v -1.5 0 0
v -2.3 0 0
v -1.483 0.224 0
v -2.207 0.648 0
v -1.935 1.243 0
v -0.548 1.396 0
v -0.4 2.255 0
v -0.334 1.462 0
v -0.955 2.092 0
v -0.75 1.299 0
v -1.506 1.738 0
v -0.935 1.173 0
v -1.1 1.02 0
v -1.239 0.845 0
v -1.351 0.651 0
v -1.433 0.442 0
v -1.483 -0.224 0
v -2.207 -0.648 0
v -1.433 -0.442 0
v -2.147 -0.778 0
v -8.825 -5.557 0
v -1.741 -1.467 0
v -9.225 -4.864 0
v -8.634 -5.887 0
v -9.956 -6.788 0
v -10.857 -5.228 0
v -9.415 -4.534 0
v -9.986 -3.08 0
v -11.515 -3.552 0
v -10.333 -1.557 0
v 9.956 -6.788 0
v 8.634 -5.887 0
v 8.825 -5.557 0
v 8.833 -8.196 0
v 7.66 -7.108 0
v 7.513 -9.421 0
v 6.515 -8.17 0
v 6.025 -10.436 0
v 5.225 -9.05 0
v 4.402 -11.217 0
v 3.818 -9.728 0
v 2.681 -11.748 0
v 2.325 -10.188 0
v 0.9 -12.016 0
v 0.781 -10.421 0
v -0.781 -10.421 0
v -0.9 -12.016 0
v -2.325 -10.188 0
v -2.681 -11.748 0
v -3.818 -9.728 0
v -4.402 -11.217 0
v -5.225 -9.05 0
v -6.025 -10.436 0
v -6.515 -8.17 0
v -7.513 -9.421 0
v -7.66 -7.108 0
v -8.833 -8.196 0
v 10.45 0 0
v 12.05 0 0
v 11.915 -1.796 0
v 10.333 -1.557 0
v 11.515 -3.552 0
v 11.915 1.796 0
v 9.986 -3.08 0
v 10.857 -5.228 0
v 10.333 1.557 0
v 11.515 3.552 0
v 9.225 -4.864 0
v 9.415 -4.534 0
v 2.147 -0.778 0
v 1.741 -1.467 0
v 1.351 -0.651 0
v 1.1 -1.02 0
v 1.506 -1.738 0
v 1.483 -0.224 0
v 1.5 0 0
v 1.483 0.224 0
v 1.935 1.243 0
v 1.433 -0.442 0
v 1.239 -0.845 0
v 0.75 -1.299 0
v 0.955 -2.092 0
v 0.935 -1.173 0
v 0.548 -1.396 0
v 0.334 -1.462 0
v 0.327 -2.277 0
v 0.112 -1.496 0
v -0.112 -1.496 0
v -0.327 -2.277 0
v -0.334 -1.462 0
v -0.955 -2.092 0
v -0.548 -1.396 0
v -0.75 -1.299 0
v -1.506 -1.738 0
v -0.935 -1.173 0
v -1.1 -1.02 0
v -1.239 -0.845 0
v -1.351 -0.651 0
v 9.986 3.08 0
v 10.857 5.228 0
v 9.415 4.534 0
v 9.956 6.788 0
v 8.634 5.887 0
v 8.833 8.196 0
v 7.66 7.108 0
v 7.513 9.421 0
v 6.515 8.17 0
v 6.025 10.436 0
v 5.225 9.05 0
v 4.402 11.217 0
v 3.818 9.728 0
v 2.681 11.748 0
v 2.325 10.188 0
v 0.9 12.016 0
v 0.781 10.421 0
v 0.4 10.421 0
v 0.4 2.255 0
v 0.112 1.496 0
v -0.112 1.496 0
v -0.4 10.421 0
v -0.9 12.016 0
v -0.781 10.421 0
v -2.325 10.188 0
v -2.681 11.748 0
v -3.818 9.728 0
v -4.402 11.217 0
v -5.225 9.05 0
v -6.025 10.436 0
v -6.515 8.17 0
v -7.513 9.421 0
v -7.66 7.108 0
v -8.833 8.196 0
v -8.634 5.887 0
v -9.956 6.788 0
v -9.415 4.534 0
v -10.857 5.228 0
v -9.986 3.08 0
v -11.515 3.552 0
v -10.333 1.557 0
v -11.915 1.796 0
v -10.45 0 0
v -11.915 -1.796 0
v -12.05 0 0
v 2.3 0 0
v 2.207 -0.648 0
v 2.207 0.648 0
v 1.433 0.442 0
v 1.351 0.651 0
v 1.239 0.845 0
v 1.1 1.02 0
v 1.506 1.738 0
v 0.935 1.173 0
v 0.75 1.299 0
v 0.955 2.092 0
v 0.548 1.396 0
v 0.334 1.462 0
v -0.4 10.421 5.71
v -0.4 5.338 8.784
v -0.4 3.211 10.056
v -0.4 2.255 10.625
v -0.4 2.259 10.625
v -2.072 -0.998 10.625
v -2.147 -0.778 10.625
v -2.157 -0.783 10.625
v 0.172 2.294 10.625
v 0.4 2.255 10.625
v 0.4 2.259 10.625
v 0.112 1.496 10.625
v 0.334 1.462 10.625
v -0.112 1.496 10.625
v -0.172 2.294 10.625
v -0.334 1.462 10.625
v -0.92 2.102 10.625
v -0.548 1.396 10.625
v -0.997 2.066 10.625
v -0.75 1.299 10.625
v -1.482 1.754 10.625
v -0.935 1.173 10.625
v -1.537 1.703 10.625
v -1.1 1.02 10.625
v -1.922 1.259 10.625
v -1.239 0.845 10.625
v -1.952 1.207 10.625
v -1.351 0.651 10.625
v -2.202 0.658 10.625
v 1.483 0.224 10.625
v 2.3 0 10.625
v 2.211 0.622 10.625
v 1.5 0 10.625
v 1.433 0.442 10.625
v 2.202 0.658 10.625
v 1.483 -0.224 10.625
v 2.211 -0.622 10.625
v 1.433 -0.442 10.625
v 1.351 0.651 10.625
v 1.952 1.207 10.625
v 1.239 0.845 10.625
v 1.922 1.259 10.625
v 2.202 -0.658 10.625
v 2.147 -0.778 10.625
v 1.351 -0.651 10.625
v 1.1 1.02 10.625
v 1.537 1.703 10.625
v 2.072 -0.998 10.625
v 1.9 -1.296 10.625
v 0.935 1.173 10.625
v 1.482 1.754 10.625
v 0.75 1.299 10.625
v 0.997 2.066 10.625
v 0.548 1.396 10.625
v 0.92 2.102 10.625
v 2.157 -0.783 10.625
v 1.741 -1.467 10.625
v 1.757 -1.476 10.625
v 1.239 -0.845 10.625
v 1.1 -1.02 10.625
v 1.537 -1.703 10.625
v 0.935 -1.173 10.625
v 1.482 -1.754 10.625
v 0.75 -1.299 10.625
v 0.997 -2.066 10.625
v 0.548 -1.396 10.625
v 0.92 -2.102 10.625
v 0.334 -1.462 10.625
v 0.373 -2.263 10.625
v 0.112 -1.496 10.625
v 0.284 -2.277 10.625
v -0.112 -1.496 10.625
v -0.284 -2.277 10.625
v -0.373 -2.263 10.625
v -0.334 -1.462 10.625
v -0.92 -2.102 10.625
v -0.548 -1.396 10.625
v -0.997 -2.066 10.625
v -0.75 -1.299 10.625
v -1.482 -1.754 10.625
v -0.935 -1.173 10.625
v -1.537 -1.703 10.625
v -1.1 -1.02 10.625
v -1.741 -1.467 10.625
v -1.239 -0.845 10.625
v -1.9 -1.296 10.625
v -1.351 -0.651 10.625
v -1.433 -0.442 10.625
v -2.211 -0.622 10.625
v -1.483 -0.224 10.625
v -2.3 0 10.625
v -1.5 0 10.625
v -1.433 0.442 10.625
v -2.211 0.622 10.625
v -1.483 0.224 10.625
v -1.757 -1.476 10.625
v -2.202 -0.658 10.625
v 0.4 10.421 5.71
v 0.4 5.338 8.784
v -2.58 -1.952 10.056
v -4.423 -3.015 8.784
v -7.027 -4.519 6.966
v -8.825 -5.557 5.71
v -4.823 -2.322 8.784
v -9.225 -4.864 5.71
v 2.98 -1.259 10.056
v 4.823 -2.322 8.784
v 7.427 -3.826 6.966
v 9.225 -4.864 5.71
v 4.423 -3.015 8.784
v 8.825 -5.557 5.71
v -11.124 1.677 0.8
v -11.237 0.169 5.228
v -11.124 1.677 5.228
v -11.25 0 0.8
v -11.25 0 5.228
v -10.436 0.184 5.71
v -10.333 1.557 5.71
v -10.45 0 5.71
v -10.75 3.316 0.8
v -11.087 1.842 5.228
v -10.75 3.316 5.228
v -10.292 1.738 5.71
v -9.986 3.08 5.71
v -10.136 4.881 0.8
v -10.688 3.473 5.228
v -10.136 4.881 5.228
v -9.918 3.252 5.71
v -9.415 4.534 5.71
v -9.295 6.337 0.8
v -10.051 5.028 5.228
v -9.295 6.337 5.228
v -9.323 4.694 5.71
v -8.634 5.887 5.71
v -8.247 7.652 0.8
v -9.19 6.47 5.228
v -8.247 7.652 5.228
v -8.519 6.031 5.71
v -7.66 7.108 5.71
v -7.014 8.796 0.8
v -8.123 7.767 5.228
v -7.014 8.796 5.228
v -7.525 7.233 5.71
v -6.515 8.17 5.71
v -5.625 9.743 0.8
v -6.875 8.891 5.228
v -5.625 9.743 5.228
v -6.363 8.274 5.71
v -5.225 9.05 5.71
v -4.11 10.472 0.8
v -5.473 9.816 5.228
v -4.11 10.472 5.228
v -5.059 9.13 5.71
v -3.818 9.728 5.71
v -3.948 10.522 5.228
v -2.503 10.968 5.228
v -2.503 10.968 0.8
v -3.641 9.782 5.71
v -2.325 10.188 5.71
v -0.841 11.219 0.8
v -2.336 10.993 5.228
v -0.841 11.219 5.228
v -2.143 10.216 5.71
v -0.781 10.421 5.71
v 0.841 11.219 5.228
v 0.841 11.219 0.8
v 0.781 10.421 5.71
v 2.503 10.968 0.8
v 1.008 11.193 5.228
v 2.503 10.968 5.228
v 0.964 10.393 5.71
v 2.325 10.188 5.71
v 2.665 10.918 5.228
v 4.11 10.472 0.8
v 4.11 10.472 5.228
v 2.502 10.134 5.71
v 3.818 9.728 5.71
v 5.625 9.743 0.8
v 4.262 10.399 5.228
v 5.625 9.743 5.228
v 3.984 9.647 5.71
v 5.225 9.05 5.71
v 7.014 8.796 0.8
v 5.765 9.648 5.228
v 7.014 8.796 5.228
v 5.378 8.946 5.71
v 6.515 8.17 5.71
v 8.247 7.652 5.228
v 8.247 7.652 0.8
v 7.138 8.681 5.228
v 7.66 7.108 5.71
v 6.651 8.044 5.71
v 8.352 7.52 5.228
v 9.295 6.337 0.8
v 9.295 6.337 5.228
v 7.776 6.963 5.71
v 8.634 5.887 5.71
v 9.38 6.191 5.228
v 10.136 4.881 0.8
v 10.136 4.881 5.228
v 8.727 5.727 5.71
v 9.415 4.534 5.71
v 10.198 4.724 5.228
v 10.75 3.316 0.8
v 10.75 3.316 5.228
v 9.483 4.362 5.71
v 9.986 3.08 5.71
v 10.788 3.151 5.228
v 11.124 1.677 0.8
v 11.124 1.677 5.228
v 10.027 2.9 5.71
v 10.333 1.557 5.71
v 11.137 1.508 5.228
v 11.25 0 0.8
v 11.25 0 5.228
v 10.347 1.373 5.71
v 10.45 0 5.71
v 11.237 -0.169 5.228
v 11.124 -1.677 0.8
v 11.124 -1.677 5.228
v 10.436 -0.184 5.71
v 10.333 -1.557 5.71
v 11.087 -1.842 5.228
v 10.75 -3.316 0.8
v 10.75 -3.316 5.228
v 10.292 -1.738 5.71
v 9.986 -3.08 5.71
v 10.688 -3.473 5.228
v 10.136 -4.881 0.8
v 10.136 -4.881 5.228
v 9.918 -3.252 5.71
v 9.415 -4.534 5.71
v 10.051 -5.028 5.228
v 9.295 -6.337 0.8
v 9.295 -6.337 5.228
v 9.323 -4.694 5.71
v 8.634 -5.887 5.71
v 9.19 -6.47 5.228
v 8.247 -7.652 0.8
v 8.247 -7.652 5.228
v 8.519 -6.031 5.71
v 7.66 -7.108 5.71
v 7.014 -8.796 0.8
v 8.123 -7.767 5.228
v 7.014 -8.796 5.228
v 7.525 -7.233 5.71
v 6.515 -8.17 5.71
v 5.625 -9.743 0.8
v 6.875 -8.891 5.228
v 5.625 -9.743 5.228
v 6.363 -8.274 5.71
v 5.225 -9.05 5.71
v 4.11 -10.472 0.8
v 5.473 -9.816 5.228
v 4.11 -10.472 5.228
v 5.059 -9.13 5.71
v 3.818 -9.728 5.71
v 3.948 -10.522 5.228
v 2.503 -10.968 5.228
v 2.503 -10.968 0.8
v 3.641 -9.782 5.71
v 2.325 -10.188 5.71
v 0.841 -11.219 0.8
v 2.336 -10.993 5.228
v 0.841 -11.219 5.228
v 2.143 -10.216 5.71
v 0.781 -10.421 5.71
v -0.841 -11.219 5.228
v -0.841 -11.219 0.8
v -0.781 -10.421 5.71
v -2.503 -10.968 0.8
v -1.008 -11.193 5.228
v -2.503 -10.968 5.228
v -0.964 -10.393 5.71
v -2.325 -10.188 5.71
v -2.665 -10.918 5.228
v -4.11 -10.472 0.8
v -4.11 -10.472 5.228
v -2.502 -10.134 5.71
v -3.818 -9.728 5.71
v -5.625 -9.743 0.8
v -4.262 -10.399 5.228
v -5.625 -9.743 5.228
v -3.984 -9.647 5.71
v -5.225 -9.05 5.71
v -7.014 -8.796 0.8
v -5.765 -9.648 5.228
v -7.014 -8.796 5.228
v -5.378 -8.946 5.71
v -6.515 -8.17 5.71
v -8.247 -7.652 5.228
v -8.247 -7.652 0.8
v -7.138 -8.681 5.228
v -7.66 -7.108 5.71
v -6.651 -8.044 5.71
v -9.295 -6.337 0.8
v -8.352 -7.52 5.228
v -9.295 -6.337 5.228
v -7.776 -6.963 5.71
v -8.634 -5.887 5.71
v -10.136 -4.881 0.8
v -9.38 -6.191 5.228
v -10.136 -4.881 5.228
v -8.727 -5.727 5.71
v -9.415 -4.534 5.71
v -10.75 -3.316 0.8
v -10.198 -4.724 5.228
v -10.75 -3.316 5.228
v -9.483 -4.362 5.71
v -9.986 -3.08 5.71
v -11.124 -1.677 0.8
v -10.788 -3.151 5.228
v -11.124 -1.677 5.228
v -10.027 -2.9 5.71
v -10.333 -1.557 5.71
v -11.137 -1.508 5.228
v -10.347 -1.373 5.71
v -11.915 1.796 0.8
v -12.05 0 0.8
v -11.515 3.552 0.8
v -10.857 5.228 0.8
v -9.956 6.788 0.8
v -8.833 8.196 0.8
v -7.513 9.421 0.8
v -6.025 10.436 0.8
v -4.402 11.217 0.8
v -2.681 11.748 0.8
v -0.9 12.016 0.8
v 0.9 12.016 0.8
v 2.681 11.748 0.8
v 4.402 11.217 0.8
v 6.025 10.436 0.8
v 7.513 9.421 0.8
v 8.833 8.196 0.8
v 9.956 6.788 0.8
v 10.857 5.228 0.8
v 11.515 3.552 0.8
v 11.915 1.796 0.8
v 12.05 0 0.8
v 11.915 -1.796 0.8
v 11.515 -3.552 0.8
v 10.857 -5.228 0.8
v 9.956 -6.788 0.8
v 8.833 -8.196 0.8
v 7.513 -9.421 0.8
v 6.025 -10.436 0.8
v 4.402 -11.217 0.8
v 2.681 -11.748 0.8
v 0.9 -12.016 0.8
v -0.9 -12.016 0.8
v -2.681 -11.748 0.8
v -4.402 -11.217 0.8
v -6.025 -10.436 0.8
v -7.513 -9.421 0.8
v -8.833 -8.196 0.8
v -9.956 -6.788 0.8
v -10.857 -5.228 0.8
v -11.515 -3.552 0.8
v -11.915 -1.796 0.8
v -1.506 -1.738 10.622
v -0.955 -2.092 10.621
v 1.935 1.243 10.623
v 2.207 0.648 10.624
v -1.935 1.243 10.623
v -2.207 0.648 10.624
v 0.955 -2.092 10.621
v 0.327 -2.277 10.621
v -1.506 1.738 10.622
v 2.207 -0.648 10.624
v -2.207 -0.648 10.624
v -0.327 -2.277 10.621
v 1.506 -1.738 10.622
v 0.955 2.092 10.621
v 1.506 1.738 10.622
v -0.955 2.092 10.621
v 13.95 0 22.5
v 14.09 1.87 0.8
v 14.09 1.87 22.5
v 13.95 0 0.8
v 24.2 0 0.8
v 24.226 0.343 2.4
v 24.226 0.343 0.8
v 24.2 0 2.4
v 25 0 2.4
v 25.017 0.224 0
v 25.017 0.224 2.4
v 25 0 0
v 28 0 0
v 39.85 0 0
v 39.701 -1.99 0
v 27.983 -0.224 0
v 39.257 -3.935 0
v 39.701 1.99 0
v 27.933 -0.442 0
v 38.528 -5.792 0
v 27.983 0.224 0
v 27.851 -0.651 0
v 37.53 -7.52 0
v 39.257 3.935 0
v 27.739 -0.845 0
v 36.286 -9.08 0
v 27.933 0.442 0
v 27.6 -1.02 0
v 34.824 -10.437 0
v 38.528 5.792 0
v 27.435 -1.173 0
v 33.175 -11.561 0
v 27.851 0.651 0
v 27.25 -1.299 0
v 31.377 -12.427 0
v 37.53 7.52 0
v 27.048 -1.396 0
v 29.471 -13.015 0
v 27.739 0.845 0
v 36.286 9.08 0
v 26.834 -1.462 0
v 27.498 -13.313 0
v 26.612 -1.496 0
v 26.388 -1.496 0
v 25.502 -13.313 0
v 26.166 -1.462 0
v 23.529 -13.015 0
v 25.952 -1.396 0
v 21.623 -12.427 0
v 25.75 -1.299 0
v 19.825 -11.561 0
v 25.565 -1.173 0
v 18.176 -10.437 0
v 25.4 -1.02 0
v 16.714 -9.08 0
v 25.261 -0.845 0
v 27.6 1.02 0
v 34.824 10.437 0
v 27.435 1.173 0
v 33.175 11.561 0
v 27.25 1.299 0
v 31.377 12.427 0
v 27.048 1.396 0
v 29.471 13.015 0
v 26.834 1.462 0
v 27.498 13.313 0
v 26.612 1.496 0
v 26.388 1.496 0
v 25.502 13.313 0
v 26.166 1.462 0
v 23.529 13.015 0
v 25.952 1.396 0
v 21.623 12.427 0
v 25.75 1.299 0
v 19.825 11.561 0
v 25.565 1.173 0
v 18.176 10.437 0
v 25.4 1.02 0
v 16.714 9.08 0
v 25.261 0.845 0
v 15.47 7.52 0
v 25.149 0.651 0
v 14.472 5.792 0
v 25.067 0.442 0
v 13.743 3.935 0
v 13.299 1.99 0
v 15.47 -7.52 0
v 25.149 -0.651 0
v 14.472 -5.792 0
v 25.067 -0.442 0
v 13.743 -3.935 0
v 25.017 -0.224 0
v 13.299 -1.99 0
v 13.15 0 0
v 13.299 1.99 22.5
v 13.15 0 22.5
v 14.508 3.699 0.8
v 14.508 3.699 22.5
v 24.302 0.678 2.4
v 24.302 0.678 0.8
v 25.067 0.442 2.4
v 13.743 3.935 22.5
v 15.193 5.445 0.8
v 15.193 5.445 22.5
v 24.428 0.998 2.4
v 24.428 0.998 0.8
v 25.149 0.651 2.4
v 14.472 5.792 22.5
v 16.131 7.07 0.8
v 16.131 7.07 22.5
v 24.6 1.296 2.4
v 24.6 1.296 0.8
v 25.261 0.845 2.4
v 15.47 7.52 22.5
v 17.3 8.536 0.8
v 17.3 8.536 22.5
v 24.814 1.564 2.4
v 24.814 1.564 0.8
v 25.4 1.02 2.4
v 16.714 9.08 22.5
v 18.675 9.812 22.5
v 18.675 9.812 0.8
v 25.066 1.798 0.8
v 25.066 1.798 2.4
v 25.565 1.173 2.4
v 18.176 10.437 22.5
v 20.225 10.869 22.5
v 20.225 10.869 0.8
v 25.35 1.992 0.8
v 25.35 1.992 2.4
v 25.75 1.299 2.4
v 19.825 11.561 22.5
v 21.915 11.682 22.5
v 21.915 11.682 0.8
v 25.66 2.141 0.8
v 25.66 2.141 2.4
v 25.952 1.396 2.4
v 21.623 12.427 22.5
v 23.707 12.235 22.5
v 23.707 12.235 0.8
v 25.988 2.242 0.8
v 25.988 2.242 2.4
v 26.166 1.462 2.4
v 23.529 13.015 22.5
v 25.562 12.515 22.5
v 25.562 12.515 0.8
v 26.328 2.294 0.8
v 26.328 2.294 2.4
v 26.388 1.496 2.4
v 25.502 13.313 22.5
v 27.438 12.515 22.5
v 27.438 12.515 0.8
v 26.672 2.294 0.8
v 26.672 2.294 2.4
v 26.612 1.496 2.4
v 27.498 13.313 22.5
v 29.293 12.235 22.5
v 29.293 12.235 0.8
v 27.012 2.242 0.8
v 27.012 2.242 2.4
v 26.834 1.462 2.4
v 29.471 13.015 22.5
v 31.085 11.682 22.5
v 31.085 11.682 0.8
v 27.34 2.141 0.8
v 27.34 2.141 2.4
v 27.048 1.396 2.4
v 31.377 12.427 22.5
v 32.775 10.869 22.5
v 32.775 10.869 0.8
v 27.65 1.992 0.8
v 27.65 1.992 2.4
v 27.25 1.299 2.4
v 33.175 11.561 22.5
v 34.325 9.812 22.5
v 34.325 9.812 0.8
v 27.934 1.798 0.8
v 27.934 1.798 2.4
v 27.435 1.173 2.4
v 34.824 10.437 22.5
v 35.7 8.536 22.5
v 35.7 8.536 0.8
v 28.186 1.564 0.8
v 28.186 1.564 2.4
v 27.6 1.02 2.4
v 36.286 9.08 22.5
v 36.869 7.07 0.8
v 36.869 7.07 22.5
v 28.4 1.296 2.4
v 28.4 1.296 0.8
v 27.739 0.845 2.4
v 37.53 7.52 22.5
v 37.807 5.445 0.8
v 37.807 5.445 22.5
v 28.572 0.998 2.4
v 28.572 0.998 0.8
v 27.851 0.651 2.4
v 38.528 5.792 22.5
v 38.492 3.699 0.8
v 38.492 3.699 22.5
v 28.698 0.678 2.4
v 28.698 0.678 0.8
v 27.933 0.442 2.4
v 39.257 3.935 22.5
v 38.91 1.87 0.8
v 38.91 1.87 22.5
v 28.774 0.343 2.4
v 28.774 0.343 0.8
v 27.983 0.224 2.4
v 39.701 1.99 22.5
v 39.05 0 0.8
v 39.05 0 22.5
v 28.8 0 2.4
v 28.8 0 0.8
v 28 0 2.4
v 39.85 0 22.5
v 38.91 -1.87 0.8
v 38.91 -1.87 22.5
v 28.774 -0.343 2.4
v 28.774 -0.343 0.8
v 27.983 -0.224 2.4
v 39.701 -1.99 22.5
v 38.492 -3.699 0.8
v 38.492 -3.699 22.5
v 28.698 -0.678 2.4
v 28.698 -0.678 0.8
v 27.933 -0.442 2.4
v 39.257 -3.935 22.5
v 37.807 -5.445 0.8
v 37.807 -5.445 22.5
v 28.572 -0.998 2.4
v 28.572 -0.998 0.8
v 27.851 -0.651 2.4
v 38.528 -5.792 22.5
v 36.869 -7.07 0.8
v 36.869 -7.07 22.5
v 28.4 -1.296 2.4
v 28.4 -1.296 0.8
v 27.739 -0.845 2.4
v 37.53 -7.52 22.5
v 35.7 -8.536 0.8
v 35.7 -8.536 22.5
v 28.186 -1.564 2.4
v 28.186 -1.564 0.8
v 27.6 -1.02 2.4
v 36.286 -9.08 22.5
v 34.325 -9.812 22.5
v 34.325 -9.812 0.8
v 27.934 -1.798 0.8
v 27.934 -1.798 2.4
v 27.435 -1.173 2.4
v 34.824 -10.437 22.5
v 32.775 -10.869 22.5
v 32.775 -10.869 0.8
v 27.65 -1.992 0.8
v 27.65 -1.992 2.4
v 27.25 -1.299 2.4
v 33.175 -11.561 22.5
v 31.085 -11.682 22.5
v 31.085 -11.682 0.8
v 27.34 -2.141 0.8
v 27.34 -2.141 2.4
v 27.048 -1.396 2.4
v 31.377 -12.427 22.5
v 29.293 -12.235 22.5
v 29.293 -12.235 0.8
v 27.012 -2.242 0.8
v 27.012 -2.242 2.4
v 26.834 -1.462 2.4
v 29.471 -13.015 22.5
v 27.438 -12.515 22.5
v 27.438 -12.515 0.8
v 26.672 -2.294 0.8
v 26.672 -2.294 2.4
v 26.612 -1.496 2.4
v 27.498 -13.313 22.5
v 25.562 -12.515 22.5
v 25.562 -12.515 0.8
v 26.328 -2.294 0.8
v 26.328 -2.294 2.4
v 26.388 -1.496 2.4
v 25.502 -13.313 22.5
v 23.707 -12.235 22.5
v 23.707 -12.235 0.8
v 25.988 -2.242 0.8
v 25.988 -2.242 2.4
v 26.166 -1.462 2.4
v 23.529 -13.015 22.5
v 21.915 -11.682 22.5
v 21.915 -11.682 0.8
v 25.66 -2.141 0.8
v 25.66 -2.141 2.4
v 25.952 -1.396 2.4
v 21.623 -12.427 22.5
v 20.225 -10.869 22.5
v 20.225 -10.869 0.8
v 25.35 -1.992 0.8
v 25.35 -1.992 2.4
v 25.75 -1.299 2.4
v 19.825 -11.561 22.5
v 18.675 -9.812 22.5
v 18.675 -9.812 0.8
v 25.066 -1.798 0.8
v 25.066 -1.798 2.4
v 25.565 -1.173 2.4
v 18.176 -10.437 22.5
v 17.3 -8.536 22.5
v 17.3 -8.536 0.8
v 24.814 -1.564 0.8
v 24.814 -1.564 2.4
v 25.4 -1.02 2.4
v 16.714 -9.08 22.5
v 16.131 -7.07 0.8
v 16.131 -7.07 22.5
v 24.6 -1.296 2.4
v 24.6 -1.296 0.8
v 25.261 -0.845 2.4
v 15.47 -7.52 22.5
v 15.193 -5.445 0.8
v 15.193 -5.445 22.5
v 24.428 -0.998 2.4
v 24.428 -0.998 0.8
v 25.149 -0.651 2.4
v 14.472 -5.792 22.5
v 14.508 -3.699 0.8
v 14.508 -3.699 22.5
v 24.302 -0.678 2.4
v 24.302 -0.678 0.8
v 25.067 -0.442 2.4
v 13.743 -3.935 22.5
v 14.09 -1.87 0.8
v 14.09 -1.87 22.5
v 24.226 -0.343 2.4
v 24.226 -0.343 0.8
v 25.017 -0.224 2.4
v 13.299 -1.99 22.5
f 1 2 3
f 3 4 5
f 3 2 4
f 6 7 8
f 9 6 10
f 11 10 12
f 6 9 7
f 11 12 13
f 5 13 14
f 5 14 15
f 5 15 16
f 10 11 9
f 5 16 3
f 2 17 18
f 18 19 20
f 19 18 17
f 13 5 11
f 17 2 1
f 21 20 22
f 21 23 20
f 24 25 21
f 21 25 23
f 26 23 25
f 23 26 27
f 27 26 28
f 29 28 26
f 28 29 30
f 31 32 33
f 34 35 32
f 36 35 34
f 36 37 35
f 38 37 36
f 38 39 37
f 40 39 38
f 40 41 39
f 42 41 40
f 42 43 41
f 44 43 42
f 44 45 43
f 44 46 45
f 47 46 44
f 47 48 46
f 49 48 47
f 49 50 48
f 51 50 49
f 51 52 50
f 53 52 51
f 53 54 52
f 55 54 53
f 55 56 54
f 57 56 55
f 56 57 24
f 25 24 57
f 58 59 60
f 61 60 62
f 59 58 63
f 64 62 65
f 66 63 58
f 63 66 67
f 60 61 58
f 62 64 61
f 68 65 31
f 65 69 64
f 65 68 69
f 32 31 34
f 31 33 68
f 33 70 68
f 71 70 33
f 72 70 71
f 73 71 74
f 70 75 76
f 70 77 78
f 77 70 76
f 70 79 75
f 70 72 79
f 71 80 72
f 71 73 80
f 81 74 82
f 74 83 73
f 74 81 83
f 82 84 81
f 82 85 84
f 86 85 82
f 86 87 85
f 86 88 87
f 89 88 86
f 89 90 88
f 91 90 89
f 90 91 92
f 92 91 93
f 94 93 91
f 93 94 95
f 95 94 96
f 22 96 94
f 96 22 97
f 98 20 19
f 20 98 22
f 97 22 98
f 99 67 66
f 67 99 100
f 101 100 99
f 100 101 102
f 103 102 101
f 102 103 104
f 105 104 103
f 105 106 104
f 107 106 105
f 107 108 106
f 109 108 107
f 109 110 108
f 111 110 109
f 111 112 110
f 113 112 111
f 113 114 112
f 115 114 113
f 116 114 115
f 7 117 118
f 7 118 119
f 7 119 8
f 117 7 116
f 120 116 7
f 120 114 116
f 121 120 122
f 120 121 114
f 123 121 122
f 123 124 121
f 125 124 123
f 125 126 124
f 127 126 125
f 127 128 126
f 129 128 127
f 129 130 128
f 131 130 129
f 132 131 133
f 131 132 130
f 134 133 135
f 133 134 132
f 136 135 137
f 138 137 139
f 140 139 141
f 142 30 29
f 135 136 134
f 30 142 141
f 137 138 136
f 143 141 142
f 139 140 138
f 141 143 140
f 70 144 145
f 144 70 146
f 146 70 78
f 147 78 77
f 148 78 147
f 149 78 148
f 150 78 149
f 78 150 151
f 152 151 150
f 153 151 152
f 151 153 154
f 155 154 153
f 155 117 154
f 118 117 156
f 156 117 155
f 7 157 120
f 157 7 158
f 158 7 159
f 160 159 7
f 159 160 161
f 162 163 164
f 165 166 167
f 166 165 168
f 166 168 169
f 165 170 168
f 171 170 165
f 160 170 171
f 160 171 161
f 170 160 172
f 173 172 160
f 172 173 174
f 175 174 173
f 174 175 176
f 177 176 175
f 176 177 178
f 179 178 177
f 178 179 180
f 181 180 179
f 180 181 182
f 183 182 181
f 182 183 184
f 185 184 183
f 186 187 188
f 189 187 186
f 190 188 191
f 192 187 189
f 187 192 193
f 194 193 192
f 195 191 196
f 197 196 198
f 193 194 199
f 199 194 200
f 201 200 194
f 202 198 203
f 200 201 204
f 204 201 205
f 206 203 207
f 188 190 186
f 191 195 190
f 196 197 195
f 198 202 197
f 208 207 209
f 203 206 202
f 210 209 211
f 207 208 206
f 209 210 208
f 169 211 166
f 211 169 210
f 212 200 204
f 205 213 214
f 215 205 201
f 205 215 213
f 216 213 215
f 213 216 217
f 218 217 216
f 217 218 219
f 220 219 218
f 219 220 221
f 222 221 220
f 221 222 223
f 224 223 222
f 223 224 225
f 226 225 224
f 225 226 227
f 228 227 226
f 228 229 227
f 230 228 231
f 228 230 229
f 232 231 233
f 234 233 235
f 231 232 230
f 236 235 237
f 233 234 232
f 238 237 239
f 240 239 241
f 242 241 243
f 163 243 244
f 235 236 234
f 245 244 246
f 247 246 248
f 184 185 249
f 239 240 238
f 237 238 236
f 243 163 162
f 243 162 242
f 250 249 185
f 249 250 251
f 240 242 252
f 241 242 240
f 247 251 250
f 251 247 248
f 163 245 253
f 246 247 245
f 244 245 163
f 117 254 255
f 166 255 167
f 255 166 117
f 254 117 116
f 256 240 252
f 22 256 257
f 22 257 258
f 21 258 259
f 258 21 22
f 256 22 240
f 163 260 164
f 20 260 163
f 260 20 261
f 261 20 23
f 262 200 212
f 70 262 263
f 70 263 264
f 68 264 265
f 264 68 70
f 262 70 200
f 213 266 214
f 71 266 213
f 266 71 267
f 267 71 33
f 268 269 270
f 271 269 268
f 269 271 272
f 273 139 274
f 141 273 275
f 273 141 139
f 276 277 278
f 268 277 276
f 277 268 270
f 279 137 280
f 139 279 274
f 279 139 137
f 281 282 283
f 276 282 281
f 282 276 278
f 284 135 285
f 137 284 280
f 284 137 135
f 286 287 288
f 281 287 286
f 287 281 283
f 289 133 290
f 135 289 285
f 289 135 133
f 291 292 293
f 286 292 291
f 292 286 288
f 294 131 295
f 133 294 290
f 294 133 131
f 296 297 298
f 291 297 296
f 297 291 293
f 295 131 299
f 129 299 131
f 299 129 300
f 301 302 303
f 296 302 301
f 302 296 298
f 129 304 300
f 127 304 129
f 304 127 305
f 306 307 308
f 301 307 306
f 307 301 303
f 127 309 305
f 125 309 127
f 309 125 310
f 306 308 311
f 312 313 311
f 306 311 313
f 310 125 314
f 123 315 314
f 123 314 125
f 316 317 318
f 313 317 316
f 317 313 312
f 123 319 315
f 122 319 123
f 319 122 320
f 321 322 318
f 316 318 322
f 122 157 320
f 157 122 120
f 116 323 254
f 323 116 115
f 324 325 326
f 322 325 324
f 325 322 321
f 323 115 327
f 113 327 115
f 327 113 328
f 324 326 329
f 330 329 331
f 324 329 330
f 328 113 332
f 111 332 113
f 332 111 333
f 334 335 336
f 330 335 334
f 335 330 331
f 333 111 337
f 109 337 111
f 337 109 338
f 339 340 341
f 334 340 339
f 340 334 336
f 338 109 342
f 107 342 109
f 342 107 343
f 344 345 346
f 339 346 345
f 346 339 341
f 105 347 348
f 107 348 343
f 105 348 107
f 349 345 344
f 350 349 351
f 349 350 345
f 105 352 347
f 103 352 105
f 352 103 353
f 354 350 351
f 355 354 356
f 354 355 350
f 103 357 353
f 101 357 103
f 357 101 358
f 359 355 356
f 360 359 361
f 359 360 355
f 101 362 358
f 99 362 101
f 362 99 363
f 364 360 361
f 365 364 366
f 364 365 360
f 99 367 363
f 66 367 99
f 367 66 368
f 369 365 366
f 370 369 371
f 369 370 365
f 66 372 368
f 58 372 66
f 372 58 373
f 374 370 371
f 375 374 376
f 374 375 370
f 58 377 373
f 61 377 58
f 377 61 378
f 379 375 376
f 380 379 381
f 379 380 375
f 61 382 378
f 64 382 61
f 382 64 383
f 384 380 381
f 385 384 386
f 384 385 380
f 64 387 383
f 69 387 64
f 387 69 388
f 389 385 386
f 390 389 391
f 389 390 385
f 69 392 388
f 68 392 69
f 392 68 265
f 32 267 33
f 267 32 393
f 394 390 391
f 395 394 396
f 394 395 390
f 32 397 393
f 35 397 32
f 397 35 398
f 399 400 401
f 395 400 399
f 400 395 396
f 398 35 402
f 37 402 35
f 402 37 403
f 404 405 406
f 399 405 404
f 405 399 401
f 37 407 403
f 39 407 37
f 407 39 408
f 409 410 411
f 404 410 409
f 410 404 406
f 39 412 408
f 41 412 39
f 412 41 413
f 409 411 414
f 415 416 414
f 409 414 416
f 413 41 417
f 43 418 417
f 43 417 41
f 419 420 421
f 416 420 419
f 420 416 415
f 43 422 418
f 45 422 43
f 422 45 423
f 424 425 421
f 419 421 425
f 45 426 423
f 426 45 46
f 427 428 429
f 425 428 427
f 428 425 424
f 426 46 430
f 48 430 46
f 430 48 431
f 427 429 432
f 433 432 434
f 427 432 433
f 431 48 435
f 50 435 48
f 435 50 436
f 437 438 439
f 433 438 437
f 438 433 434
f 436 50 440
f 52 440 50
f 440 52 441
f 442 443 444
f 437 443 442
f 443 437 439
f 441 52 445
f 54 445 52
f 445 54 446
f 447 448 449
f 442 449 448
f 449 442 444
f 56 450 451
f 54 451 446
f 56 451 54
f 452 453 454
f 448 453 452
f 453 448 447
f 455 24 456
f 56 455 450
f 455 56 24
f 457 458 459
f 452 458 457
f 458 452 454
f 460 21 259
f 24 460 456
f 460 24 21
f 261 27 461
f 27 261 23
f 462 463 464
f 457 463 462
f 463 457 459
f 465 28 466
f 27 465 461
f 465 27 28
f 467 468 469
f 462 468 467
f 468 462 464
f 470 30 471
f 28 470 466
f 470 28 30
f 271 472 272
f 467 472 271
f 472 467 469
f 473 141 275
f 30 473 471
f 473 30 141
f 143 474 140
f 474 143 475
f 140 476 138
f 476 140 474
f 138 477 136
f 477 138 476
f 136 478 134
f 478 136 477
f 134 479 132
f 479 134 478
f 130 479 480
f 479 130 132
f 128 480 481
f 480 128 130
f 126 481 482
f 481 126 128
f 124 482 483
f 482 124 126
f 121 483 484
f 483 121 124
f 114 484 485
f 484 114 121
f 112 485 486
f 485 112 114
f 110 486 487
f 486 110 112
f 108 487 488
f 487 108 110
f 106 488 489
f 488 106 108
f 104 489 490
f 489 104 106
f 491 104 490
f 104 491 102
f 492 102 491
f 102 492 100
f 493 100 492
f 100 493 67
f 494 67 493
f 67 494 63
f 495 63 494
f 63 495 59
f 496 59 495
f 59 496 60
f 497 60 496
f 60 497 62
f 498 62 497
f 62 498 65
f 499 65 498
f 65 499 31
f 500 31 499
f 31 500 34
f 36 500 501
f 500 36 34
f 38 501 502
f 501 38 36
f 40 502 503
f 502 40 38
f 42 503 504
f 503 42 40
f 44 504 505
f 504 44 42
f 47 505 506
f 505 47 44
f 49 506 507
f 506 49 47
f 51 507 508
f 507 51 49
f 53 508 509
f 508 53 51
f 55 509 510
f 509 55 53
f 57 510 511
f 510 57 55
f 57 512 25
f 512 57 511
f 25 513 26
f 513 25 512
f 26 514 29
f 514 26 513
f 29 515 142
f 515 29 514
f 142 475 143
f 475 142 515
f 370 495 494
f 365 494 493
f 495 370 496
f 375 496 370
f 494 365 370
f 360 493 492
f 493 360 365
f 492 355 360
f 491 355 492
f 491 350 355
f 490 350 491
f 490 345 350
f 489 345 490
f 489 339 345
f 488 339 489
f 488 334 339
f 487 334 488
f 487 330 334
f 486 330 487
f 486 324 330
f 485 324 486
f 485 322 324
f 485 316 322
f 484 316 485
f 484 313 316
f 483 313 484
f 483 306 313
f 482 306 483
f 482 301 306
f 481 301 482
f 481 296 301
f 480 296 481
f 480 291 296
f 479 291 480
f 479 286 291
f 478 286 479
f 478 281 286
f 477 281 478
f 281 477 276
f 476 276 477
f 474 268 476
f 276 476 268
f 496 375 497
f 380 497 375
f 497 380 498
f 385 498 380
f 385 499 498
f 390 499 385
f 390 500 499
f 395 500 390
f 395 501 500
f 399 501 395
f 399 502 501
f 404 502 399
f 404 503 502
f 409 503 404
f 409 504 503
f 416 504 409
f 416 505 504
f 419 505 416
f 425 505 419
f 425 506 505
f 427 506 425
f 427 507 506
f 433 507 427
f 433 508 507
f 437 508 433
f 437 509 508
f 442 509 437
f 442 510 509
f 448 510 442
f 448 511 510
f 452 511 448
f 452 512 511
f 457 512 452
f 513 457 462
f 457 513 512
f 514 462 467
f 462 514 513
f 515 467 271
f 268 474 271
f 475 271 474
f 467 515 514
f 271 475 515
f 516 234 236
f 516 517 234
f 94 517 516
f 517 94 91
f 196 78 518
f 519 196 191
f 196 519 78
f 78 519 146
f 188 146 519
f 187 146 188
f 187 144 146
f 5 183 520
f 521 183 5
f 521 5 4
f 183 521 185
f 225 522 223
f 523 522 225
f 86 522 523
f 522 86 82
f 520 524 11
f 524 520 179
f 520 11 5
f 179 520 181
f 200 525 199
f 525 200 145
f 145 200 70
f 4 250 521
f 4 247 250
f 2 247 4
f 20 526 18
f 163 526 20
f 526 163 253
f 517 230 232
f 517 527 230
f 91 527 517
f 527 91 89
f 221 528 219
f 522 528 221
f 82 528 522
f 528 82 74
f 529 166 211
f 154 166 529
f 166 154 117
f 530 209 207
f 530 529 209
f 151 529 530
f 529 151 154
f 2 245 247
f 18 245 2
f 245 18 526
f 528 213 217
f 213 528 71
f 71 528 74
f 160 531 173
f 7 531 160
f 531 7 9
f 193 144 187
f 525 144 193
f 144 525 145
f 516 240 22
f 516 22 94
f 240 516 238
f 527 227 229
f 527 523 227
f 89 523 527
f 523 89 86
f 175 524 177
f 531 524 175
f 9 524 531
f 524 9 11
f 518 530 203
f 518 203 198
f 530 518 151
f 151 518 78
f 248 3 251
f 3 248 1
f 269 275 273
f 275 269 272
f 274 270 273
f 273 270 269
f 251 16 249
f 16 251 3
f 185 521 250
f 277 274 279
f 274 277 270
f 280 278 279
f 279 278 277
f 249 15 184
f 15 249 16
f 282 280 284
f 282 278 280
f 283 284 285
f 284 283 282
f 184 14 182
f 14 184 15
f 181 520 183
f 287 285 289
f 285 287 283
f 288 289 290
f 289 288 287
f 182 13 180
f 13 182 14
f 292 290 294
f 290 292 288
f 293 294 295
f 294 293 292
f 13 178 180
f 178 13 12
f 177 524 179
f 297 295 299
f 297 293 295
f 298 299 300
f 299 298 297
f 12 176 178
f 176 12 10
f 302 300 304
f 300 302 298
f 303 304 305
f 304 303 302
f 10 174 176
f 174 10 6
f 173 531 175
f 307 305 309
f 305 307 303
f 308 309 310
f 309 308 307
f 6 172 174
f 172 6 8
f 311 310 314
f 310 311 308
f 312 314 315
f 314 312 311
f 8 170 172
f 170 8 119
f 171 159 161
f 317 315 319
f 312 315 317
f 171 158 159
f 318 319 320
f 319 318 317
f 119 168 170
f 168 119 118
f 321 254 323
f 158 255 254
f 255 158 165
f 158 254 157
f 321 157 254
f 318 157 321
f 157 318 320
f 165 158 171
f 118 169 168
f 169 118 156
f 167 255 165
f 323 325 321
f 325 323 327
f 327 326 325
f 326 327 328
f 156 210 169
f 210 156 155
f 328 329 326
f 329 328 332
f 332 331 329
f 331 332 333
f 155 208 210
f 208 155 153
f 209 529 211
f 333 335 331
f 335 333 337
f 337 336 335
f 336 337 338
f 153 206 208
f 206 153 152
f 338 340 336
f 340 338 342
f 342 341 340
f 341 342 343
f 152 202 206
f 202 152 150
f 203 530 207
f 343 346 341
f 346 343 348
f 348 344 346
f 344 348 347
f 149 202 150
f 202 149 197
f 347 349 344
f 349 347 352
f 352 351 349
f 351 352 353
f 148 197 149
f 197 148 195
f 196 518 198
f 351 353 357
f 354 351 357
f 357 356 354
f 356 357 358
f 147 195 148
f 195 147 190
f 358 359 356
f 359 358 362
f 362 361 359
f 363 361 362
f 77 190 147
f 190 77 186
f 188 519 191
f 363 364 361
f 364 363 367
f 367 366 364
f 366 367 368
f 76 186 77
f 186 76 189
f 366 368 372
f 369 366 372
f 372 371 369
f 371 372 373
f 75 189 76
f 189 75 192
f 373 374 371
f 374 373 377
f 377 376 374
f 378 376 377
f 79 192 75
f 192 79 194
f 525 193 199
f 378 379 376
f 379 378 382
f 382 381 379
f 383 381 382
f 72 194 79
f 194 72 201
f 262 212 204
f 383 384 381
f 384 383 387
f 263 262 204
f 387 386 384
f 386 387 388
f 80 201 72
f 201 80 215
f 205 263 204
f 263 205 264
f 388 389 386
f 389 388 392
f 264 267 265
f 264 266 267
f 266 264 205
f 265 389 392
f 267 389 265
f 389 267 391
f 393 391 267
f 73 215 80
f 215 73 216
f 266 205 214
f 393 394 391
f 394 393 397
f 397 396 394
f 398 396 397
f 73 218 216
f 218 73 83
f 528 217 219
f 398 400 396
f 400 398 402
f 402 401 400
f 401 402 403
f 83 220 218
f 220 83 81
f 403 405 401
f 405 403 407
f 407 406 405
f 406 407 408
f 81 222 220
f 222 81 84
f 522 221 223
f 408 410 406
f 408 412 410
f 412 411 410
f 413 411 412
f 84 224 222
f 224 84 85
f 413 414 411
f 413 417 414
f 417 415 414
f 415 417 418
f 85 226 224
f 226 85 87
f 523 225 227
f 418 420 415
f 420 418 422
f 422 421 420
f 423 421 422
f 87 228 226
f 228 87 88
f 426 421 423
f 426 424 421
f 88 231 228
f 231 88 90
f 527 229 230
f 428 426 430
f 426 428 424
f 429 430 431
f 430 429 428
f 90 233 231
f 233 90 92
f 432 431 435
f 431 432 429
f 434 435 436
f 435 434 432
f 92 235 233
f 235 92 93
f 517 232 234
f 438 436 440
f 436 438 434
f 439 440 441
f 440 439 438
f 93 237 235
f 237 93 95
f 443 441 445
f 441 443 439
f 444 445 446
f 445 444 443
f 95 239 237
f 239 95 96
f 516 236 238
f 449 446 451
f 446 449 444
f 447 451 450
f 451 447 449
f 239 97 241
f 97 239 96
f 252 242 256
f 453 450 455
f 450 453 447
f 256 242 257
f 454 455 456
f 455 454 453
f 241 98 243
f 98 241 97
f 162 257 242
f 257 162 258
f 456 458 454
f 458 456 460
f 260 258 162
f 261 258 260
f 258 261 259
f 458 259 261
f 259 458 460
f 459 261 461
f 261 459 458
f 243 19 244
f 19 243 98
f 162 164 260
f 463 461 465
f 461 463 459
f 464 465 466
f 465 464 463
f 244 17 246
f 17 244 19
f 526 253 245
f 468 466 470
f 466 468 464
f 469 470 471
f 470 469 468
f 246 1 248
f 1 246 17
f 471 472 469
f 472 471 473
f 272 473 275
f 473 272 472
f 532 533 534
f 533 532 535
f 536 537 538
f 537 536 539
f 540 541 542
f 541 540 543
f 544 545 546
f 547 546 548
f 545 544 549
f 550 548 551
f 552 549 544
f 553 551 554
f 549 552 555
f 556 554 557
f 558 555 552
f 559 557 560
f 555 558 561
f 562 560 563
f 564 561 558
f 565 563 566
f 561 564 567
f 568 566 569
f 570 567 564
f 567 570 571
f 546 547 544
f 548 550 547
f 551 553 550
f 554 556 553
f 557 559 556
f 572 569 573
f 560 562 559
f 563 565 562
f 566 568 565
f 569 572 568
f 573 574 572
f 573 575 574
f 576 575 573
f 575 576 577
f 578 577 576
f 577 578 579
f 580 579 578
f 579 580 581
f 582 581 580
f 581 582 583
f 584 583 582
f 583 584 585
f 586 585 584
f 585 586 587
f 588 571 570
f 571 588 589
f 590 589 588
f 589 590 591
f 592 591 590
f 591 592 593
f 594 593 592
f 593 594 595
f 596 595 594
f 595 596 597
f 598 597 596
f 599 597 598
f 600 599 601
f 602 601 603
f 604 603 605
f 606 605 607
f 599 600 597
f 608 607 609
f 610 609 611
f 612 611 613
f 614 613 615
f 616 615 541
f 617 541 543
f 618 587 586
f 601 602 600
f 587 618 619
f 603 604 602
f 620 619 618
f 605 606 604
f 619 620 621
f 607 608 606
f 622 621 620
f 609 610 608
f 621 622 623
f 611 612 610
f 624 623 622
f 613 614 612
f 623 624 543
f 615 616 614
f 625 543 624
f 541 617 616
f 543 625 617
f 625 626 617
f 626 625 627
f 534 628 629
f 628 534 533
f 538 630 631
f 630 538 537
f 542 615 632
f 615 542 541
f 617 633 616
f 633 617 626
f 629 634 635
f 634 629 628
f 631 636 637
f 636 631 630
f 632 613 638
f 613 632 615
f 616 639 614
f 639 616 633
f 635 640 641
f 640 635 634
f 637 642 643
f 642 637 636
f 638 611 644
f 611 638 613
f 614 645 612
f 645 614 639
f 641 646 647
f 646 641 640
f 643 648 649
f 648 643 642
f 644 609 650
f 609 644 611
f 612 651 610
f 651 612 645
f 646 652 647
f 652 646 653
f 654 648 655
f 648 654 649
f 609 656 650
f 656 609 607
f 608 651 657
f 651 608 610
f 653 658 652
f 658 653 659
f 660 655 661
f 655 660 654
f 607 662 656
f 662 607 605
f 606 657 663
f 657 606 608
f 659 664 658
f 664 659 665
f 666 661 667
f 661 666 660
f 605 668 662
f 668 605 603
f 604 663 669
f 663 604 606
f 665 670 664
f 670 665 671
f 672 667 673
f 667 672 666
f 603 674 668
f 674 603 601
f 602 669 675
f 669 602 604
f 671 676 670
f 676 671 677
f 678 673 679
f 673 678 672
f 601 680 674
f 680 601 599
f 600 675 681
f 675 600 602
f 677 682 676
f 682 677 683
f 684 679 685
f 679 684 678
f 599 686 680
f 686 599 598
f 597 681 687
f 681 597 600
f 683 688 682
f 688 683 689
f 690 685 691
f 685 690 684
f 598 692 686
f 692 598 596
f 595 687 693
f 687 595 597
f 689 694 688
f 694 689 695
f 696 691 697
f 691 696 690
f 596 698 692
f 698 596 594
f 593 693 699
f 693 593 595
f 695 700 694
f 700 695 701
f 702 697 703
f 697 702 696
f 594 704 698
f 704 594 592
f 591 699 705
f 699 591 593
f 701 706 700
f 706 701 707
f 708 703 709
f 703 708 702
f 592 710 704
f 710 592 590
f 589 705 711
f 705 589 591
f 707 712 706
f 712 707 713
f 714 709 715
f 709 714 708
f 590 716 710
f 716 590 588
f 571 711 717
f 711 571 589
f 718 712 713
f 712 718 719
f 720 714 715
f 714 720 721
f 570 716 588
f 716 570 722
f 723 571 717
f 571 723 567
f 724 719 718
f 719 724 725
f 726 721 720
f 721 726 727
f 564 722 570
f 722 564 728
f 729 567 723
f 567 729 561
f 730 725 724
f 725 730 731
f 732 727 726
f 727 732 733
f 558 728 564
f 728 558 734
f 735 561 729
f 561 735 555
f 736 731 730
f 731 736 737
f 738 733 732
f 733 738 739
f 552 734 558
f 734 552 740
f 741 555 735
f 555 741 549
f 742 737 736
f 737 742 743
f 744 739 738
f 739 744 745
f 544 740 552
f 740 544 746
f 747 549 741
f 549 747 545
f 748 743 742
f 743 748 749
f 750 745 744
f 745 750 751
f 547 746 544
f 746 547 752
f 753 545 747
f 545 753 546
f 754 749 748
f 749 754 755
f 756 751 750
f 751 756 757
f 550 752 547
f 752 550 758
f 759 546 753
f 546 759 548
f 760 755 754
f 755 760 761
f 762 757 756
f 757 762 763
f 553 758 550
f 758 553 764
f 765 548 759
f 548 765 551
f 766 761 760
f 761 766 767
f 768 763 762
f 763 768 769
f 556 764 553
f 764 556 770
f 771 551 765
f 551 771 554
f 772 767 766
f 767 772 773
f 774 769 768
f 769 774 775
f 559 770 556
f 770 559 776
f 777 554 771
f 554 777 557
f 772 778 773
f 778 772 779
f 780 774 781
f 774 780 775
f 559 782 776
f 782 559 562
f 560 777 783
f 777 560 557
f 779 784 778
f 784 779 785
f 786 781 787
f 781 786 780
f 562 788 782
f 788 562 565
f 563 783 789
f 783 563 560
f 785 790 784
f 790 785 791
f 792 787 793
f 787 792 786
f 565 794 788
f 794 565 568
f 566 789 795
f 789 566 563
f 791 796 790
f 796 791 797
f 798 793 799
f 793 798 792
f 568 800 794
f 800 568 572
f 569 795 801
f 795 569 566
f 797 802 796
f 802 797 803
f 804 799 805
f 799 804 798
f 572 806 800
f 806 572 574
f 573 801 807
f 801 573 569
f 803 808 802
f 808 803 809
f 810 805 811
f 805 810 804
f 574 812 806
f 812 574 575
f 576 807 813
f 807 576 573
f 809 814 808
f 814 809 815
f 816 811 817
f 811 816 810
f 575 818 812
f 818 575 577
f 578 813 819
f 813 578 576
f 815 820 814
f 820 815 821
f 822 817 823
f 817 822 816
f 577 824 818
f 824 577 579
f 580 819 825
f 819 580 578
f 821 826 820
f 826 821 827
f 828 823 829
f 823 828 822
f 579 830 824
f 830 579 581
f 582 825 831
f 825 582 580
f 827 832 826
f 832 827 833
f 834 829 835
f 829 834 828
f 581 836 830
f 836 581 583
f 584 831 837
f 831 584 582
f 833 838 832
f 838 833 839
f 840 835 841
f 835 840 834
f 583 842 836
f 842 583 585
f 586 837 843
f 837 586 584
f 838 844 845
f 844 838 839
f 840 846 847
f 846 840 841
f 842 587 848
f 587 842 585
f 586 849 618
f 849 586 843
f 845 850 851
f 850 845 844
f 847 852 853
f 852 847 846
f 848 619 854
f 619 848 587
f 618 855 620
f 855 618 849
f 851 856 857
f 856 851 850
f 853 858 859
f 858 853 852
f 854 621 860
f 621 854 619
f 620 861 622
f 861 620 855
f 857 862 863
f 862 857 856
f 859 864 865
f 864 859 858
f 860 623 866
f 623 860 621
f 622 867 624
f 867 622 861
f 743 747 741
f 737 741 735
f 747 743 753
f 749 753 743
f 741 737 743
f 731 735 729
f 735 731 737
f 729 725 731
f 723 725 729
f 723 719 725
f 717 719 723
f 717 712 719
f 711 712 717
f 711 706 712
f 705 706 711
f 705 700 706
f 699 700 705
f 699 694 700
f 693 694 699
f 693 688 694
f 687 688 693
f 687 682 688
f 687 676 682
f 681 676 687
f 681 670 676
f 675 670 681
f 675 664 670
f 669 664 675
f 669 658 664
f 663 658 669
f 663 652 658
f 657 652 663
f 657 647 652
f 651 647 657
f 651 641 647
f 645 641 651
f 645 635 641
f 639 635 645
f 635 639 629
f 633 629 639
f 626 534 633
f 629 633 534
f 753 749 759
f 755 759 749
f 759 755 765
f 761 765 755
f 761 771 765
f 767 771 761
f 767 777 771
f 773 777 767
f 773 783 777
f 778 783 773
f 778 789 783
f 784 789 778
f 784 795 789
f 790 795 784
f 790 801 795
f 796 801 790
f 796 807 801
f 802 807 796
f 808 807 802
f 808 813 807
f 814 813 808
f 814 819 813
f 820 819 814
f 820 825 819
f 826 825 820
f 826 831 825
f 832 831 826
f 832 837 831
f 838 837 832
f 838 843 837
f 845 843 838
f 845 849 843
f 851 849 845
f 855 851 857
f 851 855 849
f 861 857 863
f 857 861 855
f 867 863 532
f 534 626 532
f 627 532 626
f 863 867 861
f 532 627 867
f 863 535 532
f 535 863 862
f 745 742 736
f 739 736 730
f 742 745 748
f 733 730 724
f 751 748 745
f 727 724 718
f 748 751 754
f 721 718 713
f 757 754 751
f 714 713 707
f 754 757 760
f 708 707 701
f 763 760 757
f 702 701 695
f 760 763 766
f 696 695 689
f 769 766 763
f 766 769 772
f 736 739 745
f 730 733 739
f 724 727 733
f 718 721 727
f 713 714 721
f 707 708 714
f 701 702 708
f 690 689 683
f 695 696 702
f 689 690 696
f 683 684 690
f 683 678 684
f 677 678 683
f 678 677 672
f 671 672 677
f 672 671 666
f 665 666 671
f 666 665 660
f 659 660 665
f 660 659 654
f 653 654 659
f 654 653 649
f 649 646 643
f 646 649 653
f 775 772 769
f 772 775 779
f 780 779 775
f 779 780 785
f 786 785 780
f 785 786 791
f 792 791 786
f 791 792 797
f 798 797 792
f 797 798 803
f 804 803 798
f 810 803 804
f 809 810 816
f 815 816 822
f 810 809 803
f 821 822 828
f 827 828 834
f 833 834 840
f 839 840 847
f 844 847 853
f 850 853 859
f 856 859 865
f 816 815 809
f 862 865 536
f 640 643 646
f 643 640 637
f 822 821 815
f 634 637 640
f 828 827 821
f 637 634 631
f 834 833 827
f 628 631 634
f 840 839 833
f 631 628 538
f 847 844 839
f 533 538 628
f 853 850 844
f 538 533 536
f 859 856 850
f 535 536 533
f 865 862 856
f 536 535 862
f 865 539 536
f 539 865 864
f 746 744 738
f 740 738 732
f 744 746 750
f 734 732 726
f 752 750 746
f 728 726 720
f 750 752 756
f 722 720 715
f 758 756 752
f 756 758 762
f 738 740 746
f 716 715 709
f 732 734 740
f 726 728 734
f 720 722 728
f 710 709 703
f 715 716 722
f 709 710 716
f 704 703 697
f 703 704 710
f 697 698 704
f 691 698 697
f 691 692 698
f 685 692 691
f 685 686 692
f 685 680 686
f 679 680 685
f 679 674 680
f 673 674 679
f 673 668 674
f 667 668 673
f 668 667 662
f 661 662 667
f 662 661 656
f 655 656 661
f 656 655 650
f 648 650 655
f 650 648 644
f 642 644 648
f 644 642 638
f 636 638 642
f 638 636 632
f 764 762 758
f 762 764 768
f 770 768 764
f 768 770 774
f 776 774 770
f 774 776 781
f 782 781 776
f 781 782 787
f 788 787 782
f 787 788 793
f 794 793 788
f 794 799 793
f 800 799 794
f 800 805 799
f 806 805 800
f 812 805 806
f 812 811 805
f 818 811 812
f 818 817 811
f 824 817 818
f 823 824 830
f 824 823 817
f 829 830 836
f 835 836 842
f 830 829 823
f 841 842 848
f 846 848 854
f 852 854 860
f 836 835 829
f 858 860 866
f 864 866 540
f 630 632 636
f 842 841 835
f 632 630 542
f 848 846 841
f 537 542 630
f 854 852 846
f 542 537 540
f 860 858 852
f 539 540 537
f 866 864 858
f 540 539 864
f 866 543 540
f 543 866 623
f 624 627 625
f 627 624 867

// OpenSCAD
// pipe
outerDiameter = 24.9;     
innerDiameter = 22.5;

// screw
screwDiameter = 3;

// pipe specifics
minWallThickness = 0.8;

// proportions, don't touch!
innerPartHeight = 5 + innerDiameter/4;
capHeight = innerDiameter;
fnBig = round(outerDiameter/2) + 30;
echo(fnBig=fnBig);
fnSmall = round(outerDiameter/15) + 20;
echo(fnSmall=fnSmall);


// inner part
intersection(){
    union(){
        rotate_extrude($fn = fnBig)        
            translate([innerDiameter/2 - minWallThickness, 0, 0]) 
                square([minWallThickness, innerPartHeight], false); 
        rotate_extrude($fn = fnBig)        
            translate([innerDiameter/2 - minWallThickness, 0, 0])    
                square([minWallThickness + (outerDiameter - innerDiameter)/3, minWallThickness], false);   
        for (i = [0, 120, 240]) rotate([0, 0, i]) 
            linear_extrude (innerPartHeight) 
                translate([- minWallThickness/2, 0, 0]) 
                    square([minWallThickness, innerDiameter/2 - 0.1], false);
        cylinder(innerPartHeight, screwDiameter/2 + minWallThickness, screwDiameter/2 + minWallThickness, false, $fn = fnSmall);
    };
    rotate_extrude($fn = fnBig)  
        polygon(points=[
            [screwDiameter/2, 0],
            [outerDiameter * 0.8, 0],
            [screwDiameter/2 + minWallThickness, innerPartHeight],
            [screwDiameter/2, innerPartHeight],
        ]);
};

// outer part
translate([outerDiameter + 2 * minWallThickness, 0, 0])
    rotate_extrude($fn = fnBig)  
        polygon(points=[
            [screwDiameter/2, 0],
            [outerDiameter * 0.5 + minWallThickness + 0.1, 0],
            [outerDiameter * 0.5 + minWallThickness + 0.1, capHeight],
            [outerDiameter * 0.5 + 0.1, capHeight],
            [outerDiameter * 0.5 + 0.1, minWallThickness],
            [screwDiameter/2 + minWallThickness, minWallThickness],
            [screwDiameter/2 + minWallThickness, 3 * minWallThickness],
            [screwDiameter/2, 3 * minWallThickness],
        ]);
